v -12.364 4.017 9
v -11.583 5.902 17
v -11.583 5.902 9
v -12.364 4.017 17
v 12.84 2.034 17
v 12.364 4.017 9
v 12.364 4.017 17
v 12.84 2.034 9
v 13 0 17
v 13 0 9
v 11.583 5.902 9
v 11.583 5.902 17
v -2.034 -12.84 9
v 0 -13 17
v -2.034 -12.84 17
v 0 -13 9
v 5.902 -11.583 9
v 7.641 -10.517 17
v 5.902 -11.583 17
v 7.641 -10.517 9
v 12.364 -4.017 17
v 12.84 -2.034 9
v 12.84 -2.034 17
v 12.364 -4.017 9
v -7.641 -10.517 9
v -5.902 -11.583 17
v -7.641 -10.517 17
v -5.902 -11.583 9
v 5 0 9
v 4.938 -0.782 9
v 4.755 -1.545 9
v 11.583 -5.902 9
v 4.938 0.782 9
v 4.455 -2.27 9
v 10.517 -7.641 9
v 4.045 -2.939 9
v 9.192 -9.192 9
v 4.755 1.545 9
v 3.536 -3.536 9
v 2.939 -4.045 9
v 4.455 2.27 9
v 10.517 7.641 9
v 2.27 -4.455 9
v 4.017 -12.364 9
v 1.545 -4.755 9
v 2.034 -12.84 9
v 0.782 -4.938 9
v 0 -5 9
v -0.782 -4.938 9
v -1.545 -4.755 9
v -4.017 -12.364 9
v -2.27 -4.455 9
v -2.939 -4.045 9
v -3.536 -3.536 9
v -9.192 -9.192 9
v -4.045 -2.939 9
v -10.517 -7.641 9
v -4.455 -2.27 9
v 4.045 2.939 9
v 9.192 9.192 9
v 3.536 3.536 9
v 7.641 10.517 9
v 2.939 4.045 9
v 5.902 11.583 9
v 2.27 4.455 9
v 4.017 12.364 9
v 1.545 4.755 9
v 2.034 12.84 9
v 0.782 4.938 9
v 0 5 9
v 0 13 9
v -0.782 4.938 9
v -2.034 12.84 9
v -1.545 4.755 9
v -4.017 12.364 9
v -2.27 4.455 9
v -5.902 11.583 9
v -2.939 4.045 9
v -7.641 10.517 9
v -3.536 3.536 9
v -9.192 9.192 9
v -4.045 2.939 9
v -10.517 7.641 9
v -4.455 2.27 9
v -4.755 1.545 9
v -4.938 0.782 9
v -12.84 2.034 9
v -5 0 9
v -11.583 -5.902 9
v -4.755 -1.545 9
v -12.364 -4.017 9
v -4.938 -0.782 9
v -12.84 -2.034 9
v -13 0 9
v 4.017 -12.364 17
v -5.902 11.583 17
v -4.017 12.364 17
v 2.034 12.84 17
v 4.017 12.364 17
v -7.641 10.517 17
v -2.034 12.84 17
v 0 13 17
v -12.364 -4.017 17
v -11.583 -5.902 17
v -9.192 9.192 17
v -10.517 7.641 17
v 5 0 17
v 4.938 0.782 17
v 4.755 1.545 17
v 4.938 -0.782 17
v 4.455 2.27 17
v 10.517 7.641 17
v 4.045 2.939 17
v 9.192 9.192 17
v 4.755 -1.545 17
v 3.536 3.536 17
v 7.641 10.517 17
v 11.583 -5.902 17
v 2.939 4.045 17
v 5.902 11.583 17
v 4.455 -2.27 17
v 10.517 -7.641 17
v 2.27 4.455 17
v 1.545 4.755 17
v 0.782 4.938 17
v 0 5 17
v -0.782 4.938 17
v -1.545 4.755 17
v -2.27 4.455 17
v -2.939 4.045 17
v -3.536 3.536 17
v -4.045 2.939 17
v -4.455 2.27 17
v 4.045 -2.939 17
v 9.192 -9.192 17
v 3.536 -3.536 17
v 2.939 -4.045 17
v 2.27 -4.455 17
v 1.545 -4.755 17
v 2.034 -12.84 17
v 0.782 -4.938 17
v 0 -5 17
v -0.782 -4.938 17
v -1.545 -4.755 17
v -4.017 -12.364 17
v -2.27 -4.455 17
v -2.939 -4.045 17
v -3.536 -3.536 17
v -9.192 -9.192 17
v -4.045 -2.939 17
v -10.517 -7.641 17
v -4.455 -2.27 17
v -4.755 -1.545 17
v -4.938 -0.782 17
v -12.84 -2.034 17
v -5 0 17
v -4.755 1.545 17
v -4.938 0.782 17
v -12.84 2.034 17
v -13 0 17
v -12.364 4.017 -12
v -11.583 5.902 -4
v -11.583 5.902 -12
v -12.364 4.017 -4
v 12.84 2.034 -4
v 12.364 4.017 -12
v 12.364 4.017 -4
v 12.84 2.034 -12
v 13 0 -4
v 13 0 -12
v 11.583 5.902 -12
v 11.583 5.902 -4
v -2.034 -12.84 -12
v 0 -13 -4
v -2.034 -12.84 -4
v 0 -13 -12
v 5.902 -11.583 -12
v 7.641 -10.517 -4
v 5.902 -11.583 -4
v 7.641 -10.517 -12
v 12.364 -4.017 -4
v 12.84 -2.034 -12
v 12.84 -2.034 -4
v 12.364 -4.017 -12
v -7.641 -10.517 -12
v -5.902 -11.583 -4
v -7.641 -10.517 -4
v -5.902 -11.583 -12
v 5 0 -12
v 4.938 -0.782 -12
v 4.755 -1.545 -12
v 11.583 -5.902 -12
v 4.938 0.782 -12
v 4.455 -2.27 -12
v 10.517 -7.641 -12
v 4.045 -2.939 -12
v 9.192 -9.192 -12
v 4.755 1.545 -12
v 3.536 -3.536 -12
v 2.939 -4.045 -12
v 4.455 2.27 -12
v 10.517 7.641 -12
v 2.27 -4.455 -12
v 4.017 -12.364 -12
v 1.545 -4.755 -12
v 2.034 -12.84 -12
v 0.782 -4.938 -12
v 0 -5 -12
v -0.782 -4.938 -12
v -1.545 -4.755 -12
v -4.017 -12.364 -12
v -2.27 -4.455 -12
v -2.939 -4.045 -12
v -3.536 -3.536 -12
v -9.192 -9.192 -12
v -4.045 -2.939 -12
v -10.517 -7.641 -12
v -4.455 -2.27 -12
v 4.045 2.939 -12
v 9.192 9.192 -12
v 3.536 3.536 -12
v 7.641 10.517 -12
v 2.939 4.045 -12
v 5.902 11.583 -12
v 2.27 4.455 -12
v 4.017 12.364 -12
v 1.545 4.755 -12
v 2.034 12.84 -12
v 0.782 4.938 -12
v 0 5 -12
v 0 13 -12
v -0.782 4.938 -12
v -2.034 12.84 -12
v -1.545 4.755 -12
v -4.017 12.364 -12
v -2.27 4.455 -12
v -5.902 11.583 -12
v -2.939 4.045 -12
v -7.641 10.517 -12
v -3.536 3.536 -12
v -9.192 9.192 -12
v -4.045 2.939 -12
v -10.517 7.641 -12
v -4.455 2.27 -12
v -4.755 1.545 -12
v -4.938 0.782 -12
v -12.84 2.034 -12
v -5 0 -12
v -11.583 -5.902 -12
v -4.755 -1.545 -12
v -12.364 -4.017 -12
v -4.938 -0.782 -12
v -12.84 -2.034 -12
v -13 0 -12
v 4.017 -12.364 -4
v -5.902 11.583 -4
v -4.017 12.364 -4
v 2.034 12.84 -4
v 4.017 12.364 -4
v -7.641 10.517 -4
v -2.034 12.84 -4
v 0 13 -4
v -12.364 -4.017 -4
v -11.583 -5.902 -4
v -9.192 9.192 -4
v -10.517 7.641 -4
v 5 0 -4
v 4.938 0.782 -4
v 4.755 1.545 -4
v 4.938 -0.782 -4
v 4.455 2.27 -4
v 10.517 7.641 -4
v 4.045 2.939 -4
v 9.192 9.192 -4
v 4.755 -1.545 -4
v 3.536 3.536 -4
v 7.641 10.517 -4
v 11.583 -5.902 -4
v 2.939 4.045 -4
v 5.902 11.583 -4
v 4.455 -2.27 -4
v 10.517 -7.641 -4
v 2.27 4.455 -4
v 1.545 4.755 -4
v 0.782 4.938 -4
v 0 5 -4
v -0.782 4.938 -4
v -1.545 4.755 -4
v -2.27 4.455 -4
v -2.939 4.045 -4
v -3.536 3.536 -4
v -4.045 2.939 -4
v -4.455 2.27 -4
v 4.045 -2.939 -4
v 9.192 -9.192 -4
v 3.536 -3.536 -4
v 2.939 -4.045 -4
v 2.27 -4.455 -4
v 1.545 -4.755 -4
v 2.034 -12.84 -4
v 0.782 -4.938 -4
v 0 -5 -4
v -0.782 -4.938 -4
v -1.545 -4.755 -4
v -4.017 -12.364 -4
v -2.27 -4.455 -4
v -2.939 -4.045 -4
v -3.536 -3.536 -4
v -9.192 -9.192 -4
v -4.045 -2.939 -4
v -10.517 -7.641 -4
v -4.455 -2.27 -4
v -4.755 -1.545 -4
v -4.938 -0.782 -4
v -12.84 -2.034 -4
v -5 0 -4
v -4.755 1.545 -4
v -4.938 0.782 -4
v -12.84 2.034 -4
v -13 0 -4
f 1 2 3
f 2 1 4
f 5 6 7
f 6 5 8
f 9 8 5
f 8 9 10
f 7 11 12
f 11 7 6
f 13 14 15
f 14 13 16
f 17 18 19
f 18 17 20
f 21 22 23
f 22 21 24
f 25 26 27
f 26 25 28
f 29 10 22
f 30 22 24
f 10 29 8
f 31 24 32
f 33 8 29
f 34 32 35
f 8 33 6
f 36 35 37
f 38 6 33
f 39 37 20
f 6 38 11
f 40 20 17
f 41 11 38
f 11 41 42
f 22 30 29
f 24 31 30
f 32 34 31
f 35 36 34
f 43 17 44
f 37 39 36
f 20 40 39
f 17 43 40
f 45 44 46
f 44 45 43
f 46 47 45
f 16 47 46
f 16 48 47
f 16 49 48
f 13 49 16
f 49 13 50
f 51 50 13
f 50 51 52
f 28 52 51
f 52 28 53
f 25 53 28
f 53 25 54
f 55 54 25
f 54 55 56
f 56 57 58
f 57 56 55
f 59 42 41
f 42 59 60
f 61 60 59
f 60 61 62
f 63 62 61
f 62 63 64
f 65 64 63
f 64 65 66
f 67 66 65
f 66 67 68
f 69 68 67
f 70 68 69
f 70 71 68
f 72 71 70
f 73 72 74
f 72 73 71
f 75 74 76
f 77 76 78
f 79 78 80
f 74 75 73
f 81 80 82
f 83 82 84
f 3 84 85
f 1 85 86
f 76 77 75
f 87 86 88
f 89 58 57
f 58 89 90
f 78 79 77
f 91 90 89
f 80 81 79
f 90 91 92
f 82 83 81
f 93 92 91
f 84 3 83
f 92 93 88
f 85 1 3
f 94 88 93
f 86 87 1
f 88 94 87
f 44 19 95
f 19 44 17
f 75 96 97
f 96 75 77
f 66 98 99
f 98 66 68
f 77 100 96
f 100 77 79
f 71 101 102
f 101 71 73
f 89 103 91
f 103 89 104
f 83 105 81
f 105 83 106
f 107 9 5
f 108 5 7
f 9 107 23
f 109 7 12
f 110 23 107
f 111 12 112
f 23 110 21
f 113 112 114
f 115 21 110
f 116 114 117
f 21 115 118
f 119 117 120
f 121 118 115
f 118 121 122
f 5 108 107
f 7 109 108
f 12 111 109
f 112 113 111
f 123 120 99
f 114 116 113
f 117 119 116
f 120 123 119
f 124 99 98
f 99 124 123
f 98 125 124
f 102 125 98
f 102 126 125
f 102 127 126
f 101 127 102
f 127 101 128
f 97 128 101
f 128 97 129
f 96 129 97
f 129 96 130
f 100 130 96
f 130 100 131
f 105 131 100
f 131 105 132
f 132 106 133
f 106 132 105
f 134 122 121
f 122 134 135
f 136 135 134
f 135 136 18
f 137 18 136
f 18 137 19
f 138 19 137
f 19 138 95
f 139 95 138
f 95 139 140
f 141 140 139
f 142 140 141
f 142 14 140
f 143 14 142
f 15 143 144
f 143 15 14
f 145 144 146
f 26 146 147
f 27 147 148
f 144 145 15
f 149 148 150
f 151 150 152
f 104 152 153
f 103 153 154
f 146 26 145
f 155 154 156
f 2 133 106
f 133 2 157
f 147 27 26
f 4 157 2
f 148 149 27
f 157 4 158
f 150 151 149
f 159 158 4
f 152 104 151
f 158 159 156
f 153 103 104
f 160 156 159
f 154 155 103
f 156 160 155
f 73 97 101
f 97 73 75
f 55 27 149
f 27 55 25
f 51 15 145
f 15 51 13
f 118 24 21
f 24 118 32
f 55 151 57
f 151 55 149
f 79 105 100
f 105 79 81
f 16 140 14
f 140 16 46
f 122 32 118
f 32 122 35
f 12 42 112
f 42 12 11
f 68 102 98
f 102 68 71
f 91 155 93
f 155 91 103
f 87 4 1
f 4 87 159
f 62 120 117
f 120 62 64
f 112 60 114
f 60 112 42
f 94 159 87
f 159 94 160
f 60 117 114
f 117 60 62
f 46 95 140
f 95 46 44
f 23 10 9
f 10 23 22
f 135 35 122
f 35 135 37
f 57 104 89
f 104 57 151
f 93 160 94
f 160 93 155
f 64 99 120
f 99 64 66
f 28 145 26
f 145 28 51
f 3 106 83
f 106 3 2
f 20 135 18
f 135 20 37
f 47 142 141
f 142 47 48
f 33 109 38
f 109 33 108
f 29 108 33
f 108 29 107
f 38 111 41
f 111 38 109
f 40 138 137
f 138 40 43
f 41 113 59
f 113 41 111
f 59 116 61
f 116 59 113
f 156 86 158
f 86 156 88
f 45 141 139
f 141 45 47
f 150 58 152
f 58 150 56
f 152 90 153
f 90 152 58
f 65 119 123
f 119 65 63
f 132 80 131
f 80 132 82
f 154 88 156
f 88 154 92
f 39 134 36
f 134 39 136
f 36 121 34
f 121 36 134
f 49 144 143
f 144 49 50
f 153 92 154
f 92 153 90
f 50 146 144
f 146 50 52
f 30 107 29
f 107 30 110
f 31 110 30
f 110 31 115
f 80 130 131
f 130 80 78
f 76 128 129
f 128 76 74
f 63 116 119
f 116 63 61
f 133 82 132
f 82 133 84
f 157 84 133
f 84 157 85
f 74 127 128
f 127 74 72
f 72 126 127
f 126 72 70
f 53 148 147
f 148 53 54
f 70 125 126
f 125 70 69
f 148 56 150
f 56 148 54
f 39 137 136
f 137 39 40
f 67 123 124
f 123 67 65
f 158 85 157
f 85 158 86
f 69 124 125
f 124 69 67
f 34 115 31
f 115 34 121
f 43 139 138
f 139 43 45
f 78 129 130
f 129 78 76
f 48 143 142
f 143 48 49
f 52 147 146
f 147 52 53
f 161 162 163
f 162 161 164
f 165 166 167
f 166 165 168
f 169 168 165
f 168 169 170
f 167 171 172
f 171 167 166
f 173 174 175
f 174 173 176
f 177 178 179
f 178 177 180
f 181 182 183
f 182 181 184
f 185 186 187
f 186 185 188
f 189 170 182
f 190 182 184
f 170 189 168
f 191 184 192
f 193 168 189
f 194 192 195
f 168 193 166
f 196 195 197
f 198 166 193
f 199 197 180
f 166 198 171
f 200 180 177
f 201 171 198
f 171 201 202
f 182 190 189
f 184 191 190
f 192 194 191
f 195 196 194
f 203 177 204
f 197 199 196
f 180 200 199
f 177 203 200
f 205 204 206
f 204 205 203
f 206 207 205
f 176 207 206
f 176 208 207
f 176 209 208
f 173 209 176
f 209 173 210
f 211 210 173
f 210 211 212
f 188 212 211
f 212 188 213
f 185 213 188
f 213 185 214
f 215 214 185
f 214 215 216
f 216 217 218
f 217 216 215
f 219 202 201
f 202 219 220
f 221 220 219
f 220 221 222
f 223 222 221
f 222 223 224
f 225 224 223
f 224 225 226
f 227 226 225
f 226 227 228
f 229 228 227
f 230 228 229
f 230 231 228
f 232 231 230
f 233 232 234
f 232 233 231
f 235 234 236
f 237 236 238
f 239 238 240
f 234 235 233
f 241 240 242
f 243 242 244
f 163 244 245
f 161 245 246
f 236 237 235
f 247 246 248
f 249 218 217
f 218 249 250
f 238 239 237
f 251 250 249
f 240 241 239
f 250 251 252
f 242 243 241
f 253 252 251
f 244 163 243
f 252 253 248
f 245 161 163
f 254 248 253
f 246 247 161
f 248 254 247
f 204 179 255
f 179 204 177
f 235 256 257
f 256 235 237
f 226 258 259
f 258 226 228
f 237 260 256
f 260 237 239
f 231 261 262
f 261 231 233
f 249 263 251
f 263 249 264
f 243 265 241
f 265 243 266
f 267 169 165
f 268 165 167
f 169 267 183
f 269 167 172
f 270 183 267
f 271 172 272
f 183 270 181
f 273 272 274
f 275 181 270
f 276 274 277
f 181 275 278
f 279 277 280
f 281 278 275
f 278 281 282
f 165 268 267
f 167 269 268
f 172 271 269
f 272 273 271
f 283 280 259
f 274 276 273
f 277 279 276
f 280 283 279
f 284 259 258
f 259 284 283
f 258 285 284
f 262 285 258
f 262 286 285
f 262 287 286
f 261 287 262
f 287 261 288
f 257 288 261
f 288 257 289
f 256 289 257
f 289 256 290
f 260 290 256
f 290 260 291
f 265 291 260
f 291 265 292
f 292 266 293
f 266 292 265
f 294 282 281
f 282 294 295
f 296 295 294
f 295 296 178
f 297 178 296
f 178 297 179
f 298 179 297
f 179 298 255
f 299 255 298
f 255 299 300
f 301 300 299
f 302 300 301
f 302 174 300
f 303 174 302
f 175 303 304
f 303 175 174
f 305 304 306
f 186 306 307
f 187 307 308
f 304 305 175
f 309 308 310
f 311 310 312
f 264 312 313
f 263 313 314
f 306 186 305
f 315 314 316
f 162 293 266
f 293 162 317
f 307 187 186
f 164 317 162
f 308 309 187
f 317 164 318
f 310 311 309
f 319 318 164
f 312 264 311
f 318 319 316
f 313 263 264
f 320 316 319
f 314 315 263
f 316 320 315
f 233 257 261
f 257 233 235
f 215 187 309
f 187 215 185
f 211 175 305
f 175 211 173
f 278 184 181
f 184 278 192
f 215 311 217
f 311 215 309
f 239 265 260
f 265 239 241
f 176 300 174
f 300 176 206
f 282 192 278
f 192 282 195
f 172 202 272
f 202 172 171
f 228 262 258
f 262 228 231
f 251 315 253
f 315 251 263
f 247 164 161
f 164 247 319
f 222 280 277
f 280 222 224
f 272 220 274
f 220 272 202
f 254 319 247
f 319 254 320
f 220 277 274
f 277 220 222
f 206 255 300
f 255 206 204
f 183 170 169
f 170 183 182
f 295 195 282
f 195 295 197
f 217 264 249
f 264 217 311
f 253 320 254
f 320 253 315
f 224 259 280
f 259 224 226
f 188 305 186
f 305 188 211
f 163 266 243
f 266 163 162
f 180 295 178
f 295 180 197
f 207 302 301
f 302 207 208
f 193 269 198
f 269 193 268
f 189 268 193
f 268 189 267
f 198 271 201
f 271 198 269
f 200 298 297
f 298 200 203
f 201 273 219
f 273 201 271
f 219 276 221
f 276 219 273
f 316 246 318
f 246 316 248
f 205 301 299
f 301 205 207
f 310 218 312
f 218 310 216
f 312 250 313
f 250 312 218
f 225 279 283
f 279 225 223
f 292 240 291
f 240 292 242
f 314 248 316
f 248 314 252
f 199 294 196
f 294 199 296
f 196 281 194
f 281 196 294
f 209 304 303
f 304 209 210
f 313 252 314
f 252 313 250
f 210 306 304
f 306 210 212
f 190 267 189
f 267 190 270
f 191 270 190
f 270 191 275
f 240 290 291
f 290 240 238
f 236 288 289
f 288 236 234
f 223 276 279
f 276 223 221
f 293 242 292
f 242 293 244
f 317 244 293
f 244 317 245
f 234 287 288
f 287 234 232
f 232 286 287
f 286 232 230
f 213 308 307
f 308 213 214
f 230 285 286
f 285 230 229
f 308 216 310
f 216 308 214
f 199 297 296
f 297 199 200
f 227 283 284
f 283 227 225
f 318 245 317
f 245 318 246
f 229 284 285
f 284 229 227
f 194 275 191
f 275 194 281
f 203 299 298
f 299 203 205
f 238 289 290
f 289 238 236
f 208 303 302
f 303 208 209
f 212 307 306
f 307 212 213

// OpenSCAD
module bearing6000zz(){
	difference(){
		cylinder(h=8, r=13, center=true, $fn=40);
		cylinder(h=9, r=5, center=true, $fn=40);	
	}
}


module bk12() {
	difference(){
		union(){
			linear_extrude(height = 25, center = true, convexity = 10, $fn=40)
		   		import (file = "bk12.dxf", layer = "0");
			translate([0,0,15])linear_extrude(height = 5, center = true, convexity = 10, $fn=40)
		   		import (file = "bk12.dxf", layer = "bearing_plate");
		}
	   	translate([23,-5,-6.5])rotate([90,0,0])cylinder(h=50, r=3.3, center=true, $fn=40);
	   	translate([-23,-5,-6.5])rotate([90,0,0])cylinder(h=50, r=3.3, center=true, $fn=40);
	   	translate([-23,5.6,-6.5])rotate([90,0,0])cylinder(h=4, r=10.8/2, center=true, $fn=40);
	   	translate([23,5.6,-6.5])rotate([90,0,0])cylinder(h=4, r=10.8/2, center=true, $fn=40);
	   	translate([23,-5,6.5])rotate([90,0,0])cylinder(h=50, r=3.3, center=true, $fn=40);
	   	translate([-23,-5,6.5])rotate([90,0,0])cylinder(h=50, r=3.3, center=true, $fn=40);
	   	translate([-23,5.6,6.5])rotate([90,0,0])cylinder(h=4, r=10.8/2, center=true, $fn=40);	
	   	translate([23,5.6,6.5])rotate([90,0,0])cylinder(h=4, r=10.8/2, center=true, $fn=40);
	}
	translate([0,0,13])bearing6000zz();
	translate([0,0,-8])bearing6000zz();

}

bk12();
